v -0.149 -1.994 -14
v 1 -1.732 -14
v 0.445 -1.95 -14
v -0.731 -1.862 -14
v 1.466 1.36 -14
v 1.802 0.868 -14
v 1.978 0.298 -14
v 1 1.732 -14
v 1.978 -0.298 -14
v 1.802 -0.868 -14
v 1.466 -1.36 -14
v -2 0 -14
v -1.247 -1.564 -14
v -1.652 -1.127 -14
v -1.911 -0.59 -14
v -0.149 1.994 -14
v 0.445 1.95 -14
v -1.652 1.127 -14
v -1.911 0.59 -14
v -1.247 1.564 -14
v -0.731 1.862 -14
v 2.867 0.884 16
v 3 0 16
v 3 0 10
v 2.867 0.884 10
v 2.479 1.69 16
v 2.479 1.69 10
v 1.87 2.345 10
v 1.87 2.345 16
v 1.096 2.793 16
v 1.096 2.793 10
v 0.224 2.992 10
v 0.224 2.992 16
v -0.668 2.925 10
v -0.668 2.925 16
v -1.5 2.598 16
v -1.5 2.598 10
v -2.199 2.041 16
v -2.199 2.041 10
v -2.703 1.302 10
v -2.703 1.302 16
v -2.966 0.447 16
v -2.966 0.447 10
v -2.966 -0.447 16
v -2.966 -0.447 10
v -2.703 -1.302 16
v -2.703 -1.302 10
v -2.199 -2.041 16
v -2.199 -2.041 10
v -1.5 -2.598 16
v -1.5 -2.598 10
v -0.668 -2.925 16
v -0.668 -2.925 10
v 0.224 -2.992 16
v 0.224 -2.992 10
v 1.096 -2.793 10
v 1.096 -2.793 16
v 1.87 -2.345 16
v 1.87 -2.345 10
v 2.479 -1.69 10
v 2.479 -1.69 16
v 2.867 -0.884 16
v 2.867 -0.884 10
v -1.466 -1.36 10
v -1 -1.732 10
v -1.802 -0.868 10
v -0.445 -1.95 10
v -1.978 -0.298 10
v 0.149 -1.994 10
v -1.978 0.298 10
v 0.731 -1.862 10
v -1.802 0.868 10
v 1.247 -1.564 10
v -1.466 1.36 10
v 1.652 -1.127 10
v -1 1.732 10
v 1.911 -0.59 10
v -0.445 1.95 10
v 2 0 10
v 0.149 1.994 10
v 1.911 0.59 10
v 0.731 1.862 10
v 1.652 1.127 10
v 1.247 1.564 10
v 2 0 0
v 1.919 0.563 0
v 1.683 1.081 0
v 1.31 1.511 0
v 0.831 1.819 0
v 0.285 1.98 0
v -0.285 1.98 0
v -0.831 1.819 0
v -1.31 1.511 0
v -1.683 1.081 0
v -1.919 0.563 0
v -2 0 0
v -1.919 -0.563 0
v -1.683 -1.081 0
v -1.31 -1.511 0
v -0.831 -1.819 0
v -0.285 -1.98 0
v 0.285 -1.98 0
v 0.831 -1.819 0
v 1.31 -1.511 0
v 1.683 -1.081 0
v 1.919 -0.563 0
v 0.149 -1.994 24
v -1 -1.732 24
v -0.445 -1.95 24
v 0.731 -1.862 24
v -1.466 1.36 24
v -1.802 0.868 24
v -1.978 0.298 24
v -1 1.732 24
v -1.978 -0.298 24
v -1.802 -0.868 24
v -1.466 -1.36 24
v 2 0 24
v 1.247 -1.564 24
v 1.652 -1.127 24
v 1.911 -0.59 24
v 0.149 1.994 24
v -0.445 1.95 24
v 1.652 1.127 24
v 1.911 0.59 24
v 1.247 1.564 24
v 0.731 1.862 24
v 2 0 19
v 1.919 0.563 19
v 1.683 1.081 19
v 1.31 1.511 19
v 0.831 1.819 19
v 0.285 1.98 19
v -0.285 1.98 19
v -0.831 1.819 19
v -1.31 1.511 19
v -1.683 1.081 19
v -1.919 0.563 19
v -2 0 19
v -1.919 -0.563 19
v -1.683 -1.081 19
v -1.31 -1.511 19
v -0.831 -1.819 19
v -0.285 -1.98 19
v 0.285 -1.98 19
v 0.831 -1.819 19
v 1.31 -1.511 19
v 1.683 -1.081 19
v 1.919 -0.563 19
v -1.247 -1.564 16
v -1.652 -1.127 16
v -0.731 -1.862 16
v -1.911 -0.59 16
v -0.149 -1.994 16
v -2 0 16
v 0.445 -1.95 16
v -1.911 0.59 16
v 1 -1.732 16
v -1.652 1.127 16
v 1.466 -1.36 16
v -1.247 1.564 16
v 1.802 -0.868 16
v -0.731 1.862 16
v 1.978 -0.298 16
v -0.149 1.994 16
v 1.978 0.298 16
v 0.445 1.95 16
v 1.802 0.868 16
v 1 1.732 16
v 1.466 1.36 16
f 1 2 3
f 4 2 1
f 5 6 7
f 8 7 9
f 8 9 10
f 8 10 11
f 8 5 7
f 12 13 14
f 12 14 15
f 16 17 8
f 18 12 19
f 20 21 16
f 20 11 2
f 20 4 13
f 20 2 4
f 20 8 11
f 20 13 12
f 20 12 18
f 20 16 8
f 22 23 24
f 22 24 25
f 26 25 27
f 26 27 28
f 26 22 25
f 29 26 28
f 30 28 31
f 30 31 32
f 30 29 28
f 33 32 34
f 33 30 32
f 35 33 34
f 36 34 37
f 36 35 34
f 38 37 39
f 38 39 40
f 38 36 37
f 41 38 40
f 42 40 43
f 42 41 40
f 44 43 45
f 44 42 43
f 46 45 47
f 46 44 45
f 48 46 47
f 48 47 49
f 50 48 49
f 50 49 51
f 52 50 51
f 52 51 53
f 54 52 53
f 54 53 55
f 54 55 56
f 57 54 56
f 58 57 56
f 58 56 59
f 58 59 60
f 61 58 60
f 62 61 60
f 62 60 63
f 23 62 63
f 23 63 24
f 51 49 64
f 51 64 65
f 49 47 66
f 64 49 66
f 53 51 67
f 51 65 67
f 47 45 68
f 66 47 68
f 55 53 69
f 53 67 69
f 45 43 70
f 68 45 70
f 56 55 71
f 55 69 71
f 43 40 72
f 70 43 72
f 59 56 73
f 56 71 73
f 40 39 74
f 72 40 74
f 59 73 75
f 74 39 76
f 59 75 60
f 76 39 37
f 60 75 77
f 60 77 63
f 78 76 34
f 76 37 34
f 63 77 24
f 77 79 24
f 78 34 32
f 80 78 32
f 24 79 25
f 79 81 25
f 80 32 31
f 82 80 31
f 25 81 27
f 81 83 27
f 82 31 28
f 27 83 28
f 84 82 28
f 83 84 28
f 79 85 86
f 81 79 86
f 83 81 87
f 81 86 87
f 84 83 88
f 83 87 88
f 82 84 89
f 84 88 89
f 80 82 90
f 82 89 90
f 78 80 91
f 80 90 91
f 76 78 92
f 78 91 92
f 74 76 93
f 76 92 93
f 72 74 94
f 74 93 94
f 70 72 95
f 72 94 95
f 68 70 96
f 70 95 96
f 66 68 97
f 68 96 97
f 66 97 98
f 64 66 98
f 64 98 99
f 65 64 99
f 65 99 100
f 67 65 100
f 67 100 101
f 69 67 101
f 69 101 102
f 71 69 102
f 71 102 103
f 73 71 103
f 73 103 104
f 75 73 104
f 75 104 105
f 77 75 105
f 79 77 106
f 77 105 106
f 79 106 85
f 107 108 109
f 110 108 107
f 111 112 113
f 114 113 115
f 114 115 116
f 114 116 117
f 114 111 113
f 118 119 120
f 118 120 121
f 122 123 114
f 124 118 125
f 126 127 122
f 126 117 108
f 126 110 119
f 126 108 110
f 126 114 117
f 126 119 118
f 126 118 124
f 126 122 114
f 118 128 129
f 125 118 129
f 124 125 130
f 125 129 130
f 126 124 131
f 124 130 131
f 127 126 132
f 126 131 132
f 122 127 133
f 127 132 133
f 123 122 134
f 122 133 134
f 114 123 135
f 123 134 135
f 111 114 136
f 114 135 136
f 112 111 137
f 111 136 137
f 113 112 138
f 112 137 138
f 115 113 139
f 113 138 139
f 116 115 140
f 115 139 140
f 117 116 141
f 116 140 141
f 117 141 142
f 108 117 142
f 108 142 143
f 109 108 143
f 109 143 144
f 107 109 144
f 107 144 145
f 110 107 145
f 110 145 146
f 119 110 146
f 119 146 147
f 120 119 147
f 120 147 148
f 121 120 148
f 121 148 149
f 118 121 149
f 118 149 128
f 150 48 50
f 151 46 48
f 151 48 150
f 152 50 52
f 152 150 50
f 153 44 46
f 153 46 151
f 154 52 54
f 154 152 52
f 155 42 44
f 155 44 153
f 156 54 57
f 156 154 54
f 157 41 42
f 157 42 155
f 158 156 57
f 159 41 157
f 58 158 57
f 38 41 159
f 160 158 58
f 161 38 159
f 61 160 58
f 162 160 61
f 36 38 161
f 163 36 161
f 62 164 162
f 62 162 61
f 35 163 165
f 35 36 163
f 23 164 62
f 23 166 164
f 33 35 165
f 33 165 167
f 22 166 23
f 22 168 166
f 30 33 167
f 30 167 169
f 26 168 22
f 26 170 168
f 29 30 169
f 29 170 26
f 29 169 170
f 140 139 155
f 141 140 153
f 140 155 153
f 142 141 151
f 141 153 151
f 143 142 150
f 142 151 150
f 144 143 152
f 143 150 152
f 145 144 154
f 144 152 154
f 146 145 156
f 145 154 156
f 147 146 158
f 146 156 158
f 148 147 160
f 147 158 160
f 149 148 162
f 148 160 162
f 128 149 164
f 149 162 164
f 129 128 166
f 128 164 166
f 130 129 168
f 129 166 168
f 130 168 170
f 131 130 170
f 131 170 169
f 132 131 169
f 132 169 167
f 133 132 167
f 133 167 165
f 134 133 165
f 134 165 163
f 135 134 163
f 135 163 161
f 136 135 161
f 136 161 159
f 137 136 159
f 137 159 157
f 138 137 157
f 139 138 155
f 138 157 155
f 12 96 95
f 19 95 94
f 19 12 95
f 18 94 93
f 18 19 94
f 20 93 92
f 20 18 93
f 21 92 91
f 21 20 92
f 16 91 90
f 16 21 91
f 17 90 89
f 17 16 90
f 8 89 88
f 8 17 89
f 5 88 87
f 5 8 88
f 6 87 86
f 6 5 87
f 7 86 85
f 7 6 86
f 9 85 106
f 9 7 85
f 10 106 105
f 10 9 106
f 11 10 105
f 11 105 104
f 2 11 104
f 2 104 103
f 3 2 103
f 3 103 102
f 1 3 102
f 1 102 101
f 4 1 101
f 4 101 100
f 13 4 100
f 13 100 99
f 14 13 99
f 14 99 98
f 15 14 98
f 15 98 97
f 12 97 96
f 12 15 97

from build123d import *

# Parameters (mm, degrees)
SKETCH1_R           = 2
BOSS_EXTRUDE1_DEPTH = 24
SKETCH3_R           = 3
BOSS_EXTRUDE3_DEPTH = 9
BOSS_EXTRUDE4_START = 14
SKETCH4_R           = 2
BOSS_EXTRUDE4_DEPTH = 14
CUT_EXTRUDE1_START  = -3
SKETCH5_R           = 4
SKETCH5_R_2         = 2
CUT_EXTRUDE1_DEPTH  = 3


with BuildPart() as part:
    # Sketch1 → Boss-Extrude1 (new body)
    with BuildSketch(Plane.XY):
        Circle(SKETCH1_R)
    extrude(amount=BOSS_EXTRUDE1_DEPTH)

    # Sketch3 → Boss-Extrude3 (add)
    with BuildSketch(Plane.XY.offset(19)):
        Circle(SKETCH3_R)
    extrude(amount=-BOSS_EXTRUDE3_DEPTH)

    # Sketch4 → Boss-Extrude4 (add)
    with BuildSketch(Plane(origin=(0, 0, 0), x_dir=(-1, 0, 0), z_dir=(0, 0, -1)).offset(BOSS_EXTRUDE4_START)):
        Circle(SKETCH4_R)
    extrude(amount=-BOSS_EXTRUDE4_DEPTH)

    # Sketch5 → Cut-Extrude1 (cut)
    with BuildSketch(Plane.XY.offset(19).offset(CUT_EXTRUDE1_START)):
        Circle(SKETCH5_R)
        with Locations(Location((0, 0, 0), (0, 0, 180))):
            Circle(SKETCH5_R_2, mode=Mode.SUBTRACT)
    extrude(amount=CUT_EXTRUDE1_DEPTH, mode=Mode.SUBTRACT)


solid = part.part
